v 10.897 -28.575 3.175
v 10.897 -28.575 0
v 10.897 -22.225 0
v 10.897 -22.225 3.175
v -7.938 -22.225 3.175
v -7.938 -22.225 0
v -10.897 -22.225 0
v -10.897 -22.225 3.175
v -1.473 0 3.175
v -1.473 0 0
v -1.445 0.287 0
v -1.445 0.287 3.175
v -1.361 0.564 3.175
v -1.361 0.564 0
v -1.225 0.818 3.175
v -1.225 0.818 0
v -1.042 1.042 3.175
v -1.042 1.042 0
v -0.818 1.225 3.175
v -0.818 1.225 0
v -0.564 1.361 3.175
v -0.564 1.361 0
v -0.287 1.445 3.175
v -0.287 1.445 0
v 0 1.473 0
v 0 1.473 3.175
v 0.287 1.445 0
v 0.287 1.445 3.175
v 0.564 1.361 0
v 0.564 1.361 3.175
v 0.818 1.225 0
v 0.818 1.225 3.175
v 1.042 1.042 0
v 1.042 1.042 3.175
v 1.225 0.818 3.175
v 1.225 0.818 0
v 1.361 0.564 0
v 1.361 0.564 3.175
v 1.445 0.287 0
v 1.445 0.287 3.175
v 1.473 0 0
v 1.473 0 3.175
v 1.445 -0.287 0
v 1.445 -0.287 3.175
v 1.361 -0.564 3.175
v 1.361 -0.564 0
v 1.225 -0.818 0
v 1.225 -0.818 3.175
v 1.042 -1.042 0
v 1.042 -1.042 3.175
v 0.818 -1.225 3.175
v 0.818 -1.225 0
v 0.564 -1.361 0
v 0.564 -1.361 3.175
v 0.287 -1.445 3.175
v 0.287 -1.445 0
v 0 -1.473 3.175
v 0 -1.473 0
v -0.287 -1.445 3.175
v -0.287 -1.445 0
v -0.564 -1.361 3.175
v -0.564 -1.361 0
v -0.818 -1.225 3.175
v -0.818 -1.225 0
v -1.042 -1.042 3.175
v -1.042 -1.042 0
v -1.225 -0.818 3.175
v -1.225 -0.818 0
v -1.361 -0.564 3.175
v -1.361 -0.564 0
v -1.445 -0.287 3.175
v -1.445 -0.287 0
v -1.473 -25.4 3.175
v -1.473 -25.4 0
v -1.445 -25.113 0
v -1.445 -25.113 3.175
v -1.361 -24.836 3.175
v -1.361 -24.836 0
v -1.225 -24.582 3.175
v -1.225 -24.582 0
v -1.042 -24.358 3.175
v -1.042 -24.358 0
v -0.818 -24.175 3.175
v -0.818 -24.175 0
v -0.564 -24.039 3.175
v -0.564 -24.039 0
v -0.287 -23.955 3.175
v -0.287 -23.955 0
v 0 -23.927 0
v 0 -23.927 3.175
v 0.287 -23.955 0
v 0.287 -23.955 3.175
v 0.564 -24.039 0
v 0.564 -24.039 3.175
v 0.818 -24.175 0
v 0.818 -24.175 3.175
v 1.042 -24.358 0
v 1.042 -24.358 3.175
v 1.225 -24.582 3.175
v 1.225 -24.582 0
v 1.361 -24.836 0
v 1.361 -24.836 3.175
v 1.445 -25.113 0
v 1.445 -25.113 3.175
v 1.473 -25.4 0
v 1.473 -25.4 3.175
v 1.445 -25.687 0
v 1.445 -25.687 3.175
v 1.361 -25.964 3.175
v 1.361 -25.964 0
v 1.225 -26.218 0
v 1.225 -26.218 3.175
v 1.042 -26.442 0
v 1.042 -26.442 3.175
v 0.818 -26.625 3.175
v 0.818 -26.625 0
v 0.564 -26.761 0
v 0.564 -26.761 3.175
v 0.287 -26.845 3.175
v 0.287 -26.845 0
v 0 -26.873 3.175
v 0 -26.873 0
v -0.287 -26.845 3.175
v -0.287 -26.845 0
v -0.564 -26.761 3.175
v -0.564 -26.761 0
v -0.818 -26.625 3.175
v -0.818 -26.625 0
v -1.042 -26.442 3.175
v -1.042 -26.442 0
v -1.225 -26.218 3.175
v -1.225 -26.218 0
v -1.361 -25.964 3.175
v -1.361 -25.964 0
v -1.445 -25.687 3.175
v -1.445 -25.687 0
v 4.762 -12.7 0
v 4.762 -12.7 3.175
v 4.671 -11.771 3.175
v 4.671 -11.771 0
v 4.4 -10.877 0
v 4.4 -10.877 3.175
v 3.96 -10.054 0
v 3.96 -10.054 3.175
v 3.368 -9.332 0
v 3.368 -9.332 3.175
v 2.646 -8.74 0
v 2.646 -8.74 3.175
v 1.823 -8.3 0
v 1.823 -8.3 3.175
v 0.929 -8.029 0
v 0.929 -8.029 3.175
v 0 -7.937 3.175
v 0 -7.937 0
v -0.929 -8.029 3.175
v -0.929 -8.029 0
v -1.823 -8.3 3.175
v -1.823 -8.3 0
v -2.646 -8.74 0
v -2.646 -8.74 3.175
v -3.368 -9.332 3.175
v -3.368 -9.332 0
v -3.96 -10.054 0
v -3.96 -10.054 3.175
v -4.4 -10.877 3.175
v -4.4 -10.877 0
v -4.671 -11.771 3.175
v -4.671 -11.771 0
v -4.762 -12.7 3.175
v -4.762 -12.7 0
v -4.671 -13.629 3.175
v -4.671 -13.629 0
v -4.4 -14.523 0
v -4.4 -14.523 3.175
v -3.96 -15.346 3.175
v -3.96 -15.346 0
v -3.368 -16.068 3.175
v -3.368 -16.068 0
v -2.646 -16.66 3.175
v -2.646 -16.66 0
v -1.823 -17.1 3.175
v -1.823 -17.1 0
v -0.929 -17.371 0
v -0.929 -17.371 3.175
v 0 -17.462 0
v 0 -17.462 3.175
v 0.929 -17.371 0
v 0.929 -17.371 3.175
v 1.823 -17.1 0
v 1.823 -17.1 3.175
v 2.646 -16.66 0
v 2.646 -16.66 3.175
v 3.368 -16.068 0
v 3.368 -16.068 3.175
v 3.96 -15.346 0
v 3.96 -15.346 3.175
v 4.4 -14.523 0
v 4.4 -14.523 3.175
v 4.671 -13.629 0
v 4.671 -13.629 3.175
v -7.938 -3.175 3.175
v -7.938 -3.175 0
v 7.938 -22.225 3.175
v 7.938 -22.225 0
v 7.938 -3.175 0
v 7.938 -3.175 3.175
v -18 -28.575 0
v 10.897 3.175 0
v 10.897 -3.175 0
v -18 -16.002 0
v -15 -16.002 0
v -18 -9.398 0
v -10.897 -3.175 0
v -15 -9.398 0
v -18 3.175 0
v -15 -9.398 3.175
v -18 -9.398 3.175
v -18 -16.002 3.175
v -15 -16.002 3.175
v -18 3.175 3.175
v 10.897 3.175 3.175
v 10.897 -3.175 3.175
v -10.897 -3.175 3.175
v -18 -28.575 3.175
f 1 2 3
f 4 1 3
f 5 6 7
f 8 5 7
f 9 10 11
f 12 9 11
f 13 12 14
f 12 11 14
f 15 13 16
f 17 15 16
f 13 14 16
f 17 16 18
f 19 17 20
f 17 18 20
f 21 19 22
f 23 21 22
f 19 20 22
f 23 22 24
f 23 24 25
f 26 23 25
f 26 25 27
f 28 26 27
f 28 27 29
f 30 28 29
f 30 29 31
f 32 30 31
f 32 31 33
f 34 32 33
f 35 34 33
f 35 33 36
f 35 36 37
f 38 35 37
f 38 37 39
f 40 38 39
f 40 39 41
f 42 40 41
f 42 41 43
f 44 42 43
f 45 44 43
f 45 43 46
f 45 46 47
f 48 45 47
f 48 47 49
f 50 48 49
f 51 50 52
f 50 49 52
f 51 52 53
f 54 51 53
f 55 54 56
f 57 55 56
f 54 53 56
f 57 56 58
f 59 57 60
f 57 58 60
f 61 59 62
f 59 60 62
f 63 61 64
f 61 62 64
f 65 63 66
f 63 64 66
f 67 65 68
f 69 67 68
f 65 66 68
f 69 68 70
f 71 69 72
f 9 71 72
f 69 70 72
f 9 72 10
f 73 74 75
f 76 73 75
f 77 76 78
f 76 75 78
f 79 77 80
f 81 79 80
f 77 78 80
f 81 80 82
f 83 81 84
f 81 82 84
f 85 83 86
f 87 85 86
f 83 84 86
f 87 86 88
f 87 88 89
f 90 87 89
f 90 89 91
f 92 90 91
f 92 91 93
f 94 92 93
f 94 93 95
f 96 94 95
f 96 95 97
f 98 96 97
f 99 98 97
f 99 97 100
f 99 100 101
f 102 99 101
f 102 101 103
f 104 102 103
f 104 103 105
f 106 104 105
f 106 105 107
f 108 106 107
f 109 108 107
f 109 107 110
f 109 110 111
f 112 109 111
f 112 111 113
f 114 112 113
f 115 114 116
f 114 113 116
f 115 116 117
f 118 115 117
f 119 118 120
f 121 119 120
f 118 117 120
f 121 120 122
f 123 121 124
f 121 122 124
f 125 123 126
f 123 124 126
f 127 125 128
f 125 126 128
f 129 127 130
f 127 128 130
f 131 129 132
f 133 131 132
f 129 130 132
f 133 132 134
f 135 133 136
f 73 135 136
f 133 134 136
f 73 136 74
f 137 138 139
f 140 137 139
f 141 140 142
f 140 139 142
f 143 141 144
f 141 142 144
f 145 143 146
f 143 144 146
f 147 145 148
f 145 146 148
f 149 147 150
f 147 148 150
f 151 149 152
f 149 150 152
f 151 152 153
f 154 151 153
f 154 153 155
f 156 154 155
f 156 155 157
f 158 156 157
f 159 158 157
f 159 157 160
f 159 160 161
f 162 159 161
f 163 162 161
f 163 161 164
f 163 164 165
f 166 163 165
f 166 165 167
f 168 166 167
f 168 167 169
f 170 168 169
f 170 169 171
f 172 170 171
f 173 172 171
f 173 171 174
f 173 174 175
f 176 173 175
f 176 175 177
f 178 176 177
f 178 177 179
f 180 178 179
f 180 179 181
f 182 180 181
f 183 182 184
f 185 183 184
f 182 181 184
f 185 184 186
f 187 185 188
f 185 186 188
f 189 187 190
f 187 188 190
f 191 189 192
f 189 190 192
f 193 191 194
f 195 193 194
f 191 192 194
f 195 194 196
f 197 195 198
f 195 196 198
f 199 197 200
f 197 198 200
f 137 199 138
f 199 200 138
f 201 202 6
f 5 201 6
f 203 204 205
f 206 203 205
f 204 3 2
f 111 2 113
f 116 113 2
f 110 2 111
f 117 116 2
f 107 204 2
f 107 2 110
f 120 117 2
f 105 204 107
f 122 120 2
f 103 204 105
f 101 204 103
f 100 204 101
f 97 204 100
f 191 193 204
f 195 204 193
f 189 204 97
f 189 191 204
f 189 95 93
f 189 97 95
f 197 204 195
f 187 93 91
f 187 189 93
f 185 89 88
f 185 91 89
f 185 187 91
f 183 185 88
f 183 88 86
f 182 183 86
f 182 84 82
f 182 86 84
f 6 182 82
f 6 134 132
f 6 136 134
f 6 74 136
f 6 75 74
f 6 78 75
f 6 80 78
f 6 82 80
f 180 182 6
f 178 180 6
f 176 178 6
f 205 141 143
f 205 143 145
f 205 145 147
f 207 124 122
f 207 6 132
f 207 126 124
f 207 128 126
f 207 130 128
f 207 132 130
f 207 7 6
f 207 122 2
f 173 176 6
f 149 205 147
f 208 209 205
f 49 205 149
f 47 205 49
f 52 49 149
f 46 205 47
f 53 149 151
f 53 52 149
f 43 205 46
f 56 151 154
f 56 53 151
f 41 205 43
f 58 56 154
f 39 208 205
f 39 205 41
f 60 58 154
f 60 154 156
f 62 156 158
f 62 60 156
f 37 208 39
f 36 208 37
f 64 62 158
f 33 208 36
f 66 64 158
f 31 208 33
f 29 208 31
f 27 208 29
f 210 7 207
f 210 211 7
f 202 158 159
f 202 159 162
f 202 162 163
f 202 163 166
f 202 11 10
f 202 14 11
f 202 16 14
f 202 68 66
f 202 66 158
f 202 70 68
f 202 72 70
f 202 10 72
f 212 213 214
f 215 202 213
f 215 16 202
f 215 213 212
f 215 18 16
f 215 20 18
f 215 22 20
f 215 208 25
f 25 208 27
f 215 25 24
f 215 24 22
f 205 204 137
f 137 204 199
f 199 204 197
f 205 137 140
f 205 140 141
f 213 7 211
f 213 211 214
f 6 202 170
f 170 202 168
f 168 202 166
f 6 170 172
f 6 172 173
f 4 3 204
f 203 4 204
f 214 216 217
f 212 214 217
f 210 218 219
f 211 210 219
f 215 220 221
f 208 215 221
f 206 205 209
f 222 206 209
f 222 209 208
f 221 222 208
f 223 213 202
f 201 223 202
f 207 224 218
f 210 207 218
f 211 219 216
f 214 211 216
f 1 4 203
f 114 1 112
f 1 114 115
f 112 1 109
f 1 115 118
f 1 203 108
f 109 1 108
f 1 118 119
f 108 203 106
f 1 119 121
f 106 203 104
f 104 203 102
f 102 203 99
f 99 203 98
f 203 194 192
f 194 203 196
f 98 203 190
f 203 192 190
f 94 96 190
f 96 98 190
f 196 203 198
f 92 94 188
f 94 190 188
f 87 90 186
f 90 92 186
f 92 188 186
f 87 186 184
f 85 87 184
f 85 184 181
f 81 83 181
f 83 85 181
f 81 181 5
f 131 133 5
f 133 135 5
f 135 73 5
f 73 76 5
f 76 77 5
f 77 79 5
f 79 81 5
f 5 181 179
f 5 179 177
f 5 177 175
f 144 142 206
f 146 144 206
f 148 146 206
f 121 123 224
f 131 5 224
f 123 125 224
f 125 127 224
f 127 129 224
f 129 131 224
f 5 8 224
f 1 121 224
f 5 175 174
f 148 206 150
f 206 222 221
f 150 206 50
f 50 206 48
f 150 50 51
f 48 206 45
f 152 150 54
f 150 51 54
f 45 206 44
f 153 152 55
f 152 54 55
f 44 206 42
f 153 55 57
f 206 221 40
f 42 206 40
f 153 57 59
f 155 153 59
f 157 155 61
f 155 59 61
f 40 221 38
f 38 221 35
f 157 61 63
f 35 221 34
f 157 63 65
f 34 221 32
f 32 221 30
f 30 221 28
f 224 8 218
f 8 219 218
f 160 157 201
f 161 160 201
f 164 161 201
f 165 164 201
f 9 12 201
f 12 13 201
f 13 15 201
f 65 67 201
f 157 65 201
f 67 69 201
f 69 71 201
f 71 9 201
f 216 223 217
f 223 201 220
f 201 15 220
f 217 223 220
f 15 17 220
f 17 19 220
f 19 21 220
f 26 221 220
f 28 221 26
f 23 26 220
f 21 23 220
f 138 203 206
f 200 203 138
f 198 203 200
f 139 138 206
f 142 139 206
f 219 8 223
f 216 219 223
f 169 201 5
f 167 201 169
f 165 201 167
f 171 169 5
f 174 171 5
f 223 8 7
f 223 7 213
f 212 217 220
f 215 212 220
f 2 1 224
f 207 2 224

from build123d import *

# Parameters (mm, degrees)
BOSS_EXTRUDE1_DEPTH       = 3.175
F_4_CLEARANCE_HOLE1_D     = 2.9464
F_4_CLEARANCE_HOLE1_DEPTH = 3.302
F_4_CLEARANCE_HOLE1_TIP   = 0.885187864
CUT_EXTRUDE1_REACH        = 5.175
SKETCH4_R                 = 4.7625
BOSS_EXTRUDE2_DEPTH       = 3.175


with BuildPart() as part:
    # Sketch1 → Boss-Extrude1 (new body)
    with BuildSketch(Plane.XY):
        Polygon((7.9375, -3.175), (10.8966, -3.175), (10.8966, 3.175), (-10.8966, 3.175), (-10.8966, -3.175), (-7.9375, -3.175), (-7.9375, -22.225), (-10.8966, -22.225), (-10.8966, -28.575), (10.8966, -28.575), (10.8966, -22.225), (7.9375, -22.225), align=None)
    extrude(amount=BOSS_EXTRUDE1_DEPTH)

    # #4 Clearance Hole1
    with Locations(Plane.XY.offset(3.175)):
        with Locations((0, 0), (0, -25.4)):
            Hole(F_4_CLEARANCE_HOLE1_D / 2, depth=F_4_CLEARANCE_HOLE1_DEPTH)
            with Locations((0, 0, -(F_4_CLEARANCE_HOLE1_DEPTH + F_4_CLEARANCE_HOLE1_TIP / 2))):  # 118° drill point
                Cone(0, F_4_CLEARANCE_HOLE1_D / 2, F_4_CLEARANCE_HOLE1_TIP, mode=Mode.SUBTRACT)

    # Sketch4 → Cut-Extrude1 (cut, up to next)
    with BuildSketch(Plane.XY.offset(3.175), mode=Mode.PRIVATE) as cut_extrude1_sk1:
        with Locations((0, -12.7)):
            Circle(SKETCH4_R)
    cut_extrude1_tool1 = extrude(cut_extrude1_sk1.sketch, amount=-CUT_EXTRUDE1_REACH, mode=Mode.PRIVATE) & part.part
    add(cut_extrude1_tool1.solids().sort_by_distance((0, -12.7, 3.175))[0], mode=Mode.SUBTRACT)

    # Sketch5 → Boss-Extrude2 (add)
    with BuildSketch(Plane.XY.offset(3.175)):
        Polygon((-10.8966, -3.175), (-10.8966, -22.225), (-10.8966, -28.575), (-18, -28.575), (-18, -16.002), (-15, -16.002), (-15, -9.398), (-18, -9.398), (-18, 3.175), (-10.8966, 3.175), align=None)
    extrude(amount=-BOSS_EXTRUDE2_DEPTH)


solid = part.part
